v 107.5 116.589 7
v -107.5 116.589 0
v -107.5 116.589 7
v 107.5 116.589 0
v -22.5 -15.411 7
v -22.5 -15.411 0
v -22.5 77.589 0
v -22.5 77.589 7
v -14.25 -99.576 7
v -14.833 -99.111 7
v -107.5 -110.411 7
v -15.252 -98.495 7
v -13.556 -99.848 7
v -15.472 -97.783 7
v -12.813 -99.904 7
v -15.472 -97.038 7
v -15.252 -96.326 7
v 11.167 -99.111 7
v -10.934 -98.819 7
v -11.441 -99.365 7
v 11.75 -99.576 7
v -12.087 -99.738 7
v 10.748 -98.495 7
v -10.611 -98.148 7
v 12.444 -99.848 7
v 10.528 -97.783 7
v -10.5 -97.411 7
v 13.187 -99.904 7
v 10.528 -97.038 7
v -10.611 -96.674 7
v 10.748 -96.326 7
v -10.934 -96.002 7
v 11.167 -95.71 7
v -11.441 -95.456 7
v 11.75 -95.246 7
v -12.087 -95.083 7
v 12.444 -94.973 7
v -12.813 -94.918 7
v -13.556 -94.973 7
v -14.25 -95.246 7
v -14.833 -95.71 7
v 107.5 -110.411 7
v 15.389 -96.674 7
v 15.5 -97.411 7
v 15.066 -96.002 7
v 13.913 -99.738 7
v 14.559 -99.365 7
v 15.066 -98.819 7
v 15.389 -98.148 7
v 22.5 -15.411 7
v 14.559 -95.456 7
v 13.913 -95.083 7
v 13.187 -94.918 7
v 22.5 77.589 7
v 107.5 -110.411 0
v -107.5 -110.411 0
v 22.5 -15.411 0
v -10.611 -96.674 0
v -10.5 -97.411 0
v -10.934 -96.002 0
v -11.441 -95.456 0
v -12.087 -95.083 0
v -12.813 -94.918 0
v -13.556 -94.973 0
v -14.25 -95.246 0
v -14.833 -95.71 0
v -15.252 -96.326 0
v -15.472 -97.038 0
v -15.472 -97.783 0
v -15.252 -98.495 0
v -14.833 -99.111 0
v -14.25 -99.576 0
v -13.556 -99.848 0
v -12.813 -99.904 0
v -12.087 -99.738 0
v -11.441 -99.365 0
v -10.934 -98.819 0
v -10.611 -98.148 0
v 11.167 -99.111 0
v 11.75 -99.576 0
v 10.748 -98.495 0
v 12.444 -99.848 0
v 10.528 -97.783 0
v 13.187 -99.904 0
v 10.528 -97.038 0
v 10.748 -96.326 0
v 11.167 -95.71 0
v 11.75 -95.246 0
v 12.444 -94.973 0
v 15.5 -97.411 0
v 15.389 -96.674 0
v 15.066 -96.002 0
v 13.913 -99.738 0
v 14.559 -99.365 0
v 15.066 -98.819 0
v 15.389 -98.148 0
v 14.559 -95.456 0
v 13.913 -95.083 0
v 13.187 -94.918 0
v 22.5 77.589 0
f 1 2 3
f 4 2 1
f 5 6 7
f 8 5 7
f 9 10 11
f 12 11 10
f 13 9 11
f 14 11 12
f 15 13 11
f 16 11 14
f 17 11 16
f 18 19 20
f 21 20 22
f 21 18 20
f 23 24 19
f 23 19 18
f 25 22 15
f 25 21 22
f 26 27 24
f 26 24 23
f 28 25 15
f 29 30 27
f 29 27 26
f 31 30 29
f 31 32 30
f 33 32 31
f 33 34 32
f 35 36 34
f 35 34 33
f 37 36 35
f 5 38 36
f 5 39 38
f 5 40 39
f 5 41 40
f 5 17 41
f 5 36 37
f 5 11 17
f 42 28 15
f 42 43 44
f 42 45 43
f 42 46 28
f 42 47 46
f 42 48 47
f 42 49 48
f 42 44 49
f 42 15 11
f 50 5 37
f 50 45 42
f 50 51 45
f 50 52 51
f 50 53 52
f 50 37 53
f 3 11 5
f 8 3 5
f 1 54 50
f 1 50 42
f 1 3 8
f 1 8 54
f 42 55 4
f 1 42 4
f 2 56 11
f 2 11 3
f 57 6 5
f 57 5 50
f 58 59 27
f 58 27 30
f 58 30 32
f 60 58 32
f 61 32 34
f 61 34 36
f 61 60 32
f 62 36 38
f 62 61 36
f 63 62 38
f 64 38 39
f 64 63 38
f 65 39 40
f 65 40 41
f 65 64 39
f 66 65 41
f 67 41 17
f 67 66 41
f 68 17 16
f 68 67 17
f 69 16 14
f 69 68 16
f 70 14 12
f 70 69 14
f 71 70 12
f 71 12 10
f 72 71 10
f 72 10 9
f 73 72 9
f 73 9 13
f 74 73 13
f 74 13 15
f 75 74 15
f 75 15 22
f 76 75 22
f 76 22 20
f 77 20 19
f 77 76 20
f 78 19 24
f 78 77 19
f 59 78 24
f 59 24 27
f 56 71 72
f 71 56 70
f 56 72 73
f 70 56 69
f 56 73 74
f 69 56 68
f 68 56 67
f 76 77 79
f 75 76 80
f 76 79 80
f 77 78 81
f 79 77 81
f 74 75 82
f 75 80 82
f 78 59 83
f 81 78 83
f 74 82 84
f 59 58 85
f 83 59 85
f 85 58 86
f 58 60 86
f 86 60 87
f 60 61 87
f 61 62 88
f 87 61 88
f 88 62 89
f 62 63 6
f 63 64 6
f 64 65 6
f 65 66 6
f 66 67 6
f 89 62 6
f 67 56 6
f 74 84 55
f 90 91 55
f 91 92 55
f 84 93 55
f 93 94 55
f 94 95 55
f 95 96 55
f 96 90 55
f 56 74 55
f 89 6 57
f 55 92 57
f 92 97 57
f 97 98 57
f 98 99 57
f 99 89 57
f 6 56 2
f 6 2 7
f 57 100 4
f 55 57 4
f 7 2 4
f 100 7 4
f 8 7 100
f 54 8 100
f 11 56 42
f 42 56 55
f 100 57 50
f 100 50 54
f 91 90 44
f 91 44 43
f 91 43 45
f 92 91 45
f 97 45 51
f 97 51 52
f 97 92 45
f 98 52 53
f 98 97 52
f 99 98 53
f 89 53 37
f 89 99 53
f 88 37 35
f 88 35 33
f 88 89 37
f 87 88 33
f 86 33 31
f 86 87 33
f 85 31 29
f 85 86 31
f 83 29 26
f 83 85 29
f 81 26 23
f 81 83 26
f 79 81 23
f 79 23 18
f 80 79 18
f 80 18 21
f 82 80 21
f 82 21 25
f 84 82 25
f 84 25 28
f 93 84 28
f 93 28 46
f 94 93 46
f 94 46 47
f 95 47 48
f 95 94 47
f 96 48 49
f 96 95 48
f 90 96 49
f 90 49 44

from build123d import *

# Parameters (mm, degrees)
SKETCH1_W           = 215
SKETCH1_H           = 227
SKETCH1_R           = 2.5
SKETCH1_W_2         = 45
SKETCH1_H_2         = 93
BOSS_EXTRUDE1_DEPTH = 7


with BuildPart() as part:
    # Sketch1 → Boss-Extrude1 (new body)
    with BuildSketch(Plane.XY):
        with Locations((0, 3.089375999)):
            Rectangle(SKETCH1_W, SKETCH1_H)
        with Locations((-13, -97.410624001)):
            Circle(SKETCH1_R, mode=Mode.SUBTRACT)
        with Locations((13, -97.410624001)):
            Circle(SKETCH1_R, mode=Mode.SUBTRACT)
        with Locations((0, 31.089375999)):
            Rectangle(SKETCH1_W_2, SKETCH1_H_2, mode=Mode.SUBTRACT)
    extrude(amount=BOSS_EXTRUDE1_DEPTH)


solid = part.part
